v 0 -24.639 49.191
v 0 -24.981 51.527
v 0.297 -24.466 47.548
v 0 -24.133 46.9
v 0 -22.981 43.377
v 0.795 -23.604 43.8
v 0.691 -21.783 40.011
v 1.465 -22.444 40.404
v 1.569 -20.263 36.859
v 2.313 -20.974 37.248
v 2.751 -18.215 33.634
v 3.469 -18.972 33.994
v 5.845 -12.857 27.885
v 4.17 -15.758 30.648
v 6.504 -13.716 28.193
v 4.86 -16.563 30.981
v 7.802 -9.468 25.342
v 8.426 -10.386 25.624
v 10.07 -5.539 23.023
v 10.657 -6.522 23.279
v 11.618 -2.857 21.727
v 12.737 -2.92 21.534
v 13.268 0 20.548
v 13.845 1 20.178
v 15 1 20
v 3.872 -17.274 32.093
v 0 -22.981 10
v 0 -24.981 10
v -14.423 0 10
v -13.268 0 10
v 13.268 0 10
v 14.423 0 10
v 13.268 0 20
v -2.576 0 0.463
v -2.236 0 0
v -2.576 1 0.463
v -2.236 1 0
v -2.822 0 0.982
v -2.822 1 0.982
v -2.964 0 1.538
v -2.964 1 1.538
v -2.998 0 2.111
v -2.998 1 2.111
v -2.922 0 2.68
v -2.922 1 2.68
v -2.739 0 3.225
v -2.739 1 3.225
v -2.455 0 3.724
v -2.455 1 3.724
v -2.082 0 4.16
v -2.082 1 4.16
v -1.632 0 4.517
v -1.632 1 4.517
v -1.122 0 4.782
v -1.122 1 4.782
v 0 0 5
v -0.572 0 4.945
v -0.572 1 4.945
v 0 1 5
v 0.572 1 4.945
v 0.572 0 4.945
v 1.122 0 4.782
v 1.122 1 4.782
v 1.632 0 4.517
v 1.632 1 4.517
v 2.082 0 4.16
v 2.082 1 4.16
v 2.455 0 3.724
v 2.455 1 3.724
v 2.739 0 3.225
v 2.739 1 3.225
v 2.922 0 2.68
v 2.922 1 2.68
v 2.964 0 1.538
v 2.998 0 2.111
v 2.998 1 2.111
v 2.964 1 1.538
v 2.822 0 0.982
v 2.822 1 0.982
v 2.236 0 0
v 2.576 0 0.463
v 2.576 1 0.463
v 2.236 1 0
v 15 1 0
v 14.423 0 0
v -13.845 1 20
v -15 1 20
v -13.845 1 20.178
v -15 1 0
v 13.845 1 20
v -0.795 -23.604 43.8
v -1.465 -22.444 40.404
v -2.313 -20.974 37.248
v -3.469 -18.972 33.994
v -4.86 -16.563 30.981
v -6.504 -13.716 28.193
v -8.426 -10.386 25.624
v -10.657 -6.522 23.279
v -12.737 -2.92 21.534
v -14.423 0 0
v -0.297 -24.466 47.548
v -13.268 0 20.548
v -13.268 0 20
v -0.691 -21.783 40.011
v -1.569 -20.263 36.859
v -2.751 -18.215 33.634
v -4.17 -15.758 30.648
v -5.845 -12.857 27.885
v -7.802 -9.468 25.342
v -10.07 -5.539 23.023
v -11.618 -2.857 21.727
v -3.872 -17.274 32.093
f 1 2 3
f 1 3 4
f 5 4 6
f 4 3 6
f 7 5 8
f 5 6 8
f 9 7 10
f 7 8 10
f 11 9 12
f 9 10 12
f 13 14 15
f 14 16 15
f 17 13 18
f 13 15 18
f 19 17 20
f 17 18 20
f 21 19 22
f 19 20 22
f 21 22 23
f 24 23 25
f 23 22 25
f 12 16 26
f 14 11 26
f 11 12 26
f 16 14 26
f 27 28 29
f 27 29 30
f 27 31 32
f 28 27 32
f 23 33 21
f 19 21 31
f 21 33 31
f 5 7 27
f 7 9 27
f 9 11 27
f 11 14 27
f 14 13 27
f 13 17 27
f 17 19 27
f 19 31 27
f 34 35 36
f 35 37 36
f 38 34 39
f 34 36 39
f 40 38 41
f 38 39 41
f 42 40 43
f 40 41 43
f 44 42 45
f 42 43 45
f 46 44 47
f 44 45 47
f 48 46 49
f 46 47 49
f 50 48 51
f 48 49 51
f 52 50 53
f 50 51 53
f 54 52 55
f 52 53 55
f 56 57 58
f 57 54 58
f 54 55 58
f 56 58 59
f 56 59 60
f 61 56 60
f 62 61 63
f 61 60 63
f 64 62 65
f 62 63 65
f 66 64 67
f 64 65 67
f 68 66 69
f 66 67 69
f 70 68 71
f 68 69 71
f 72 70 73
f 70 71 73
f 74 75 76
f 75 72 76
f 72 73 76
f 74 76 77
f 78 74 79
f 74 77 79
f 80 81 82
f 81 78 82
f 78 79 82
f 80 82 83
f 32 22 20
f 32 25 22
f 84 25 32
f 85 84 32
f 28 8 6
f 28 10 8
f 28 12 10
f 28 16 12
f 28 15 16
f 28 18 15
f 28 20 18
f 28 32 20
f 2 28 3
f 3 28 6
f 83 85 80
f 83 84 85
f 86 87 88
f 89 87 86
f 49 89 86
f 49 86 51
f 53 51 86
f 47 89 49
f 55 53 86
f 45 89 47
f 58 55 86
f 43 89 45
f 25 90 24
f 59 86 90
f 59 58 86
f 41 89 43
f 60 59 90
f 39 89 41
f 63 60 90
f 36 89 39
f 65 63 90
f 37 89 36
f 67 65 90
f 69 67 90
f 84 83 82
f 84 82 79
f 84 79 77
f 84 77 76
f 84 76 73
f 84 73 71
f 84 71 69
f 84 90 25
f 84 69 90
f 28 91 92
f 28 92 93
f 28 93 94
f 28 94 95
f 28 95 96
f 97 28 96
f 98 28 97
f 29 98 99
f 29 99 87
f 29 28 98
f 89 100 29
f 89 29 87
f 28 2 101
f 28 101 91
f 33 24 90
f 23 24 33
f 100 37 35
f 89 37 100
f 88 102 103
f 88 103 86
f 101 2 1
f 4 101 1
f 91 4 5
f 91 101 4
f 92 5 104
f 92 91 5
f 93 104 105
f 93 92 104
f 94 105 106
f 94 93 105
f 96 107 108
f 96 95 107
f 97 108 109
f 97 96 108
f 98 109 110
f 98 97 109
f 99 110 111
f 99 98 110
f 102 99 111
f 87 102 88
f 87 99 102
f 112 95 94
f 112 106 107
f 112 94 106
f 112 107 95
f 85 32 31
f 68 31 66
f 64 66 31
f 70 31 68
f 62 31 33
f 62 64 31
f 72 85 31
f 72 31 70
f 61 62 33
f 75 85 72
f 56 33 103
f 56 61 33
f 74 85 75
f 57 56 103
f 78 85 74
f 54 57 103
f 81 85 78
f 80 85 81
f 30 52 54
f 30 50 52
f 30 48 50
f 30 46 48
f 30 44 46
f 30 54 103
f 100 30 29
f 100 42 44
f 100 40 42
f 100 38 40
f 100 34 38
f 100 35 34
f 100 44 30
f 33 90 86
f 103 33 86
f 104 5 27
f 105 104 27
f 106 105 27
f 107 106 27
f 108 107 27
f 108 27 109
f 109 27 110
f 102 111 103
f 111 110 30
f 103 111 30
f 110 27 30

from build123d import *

# Parameters (mm, degrees)
BOSS_EXTRUDE1_DEPTH = 60
CUT_EXTRUDE2_DEPTH  = 1
CUT_EXTRUDE3_DEPTH  = 40
CUT_EXTRUDE4_DEPTH  = 10
SKETCH9_R           = 3
CUT_EXTRUDE5_DEPTH  = 1


with BuildPart() as part:
    # Sketch1 → Boss-Extrude1 (new body)
    with BuildSketch(Plane.XY):
        Polygon((-15, 1), (15, 1), (0, -24.980762114), align=None)
        Polygon((-13.267949192, 0), (13.267949192, 0), (0, -22.980762114), align=None, mode=Mode.SUBTRACT)
    extrude(amount=BOSS_EXTRUDE1_DEPTH)

    # Sketch4 → Cut-Extrude2 (cut)
    with BuildSketch(Plane(origin=(10.816987298, -6.245190528, 0), x_dir=(0, 0, -1), z_dir=(0.8660254037844365, -0.500000000000004, 0))):
        with BuildLine():
            Line((-60, 8.366025404), (-60, -21.633974596))
            add(Edge.make_bspline(
                [(-60, -21.633974596), (-29.886538221, -24.240664674), (-20, 8.366025404)],
                knots=[0, 0, 0, 1, 1, 1], degree=2))
            Line((-20, 8.366025404), (-60, 8.366025404))
        make_face()
    cut_extrude2 = extrude(amount=-CUT_EXTRUDE2_DEPTH, mode=Mode.SUBTRACT)

    # Mirror1: Cut-Extrude2 across plane
    add(cut_extrude2.mirror(Plane(origin=(0, 0, 0), x_dir=(0, 0, 1), z_dir=(1, 0, 0))), mode=Mode.SUBTRACT)

    # Sketch5 → Cut-Extrude3 (cut)
    with BuildSketch(Plane.XY.offset(60)):
        Polygon((-13.845299459, 0.999999995), (13.845299462, 1), (13.267949197, 8e-09), (-13.267949192, 0), align=None)
    extrude(amount=-CUT_EXTRUDE3_DEPTH, mode=Mode.SUBTRACT)

    # Sketch8 → Cut-Extrude4 (cut)
    with BuildSketch(Plane(origin=(0, 0, 0), x_dir=(-1, 0, 0), z_dir=(0, 0, -1))):
        Polygon((-15.872166784, 0), (15.872166784, 0), (0, -24.980762114), align=None)
    extrude(amount=-CUT_EXTRUDE4_DEPTH, mode=Mode.SUBTRACT)

    # Sketch9 → Cut-Extrude5 (cut)
    with BuildSketch(Plane(origin=(0, 1, 0), x_dir=(1, 0, 0), z_dir=(0, 1, 0))):
        with Locations((0, -2)):
            Circle(SKETCH9_R)
    extrude(amount=-CUT_EXTRUDE5_DEPTH, mode=Mode.SUBTRACT)


solid = part.part
